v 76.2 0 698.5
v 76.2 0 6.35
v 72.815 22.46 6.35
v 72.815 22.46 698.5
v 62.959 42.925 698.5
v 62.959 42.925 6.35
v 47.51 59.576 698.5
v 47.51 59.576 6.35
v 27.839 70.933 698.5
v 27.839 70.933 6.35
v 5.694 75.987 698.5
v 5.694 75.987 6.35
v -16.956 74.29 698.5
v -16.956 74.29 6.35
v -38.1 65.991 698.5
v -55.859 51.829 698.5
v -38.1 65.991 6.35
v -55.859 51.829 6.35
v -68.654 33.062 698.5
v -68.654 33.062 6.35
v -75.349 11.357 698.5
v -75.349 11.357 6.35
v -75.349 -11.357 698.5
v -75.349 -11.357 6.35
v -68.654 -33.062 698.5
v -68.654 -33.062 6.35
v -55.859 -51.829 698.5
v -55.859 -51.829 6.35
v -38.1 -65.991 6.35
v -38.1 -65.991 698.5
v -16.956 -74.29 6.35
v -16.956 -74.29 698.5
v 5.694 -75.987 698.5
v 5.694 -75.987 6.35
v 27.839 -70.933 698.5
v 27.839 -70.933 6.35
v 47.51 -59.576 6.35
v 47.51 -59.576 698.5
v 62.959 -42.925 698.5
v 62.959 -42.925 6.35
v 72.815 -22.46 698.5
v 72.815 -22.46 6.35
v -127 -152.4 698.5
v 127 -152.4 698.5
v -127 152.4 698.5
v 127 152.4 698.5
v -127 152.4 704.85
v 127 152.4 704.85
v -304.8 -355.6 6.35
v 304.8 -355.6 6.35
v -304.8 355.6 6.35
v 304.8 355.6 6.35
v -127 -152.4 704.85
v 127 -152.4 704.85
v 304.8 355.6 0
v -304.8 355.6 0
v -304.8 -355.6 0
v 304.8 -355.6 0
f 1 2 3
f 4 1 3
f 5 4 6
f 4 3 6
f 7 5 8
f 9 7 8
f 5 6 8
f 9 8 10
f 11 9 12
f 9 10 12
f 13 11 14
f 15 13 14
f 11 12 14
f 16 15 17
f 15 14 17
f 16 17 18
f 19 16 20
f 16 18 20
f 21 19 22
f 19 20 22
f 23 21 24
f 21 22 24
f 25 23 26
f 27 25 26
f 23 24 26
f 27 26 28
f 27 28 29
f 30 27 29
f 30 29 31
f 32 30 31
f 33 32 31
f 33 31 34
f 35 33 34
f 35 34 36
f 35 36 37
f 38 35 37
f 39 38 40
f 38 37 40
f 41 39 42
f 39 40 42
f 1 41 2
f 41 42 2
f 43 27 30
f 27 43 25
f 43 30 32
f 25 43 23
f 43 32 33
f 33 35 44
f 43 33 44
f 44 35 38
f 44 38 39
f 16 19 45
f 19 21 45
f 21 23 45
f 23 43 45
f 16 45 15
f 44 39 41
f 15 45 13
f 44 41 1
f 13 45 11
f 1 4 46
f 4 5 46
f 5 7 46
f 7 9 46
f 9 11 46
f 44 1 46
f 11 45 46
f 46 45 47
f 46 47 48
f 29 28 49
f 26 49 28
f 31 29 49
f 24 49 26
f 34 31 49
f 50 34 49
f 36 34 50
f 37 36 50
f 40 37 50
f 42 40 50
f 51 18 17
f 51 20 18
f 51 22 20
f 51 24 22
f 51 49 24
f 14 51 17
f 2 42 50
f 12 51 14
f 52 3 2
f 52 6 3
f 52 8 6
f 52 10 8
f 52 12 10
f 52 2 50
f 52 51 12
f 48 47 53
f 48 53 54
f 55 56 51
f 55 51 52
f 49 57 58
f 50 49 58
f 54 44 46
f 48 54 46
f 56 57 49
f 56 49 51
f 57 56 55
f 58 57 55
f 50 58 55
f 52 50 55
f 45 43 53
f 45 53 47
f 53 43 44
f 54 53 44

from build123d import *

# Parameters (mm, degrees)
F0_W     = 609.6
F0_H     = 711.2
F1_DEPTH = 6.35
F2_R     = 76.2
F3_DEPTH = 692.15
F4_W     = 254
F4_H     = 304.8
F4_R     = 76.2
F5_DEPTH = 6.35


with BuildPart() as f1:
    # F0 (on Top) → F1 (new body)
    with BuildSketch(Plane.XY):
        Rectangle(F0_W, F0_H)
    extrude(amount=F1_DEPTH)

    # F2 (on face) → F3 (join)
    with BuildSketch(Plane.XY.offset(6.35)):
        Circle(F2_R)
    extrude(amount=F3_DEPTH)

    # F4 (on face) → F5 (join)
    with BuildSketch(Plane.XY.offset(698.5)):
        Rectangle(F4_W, F4_H)
        Circle(F4_R, mode=Mode.SUBTRACT)
        Circle(F4_R)
    extrude(amount=F5_DEPTH)


solid = f1.part
